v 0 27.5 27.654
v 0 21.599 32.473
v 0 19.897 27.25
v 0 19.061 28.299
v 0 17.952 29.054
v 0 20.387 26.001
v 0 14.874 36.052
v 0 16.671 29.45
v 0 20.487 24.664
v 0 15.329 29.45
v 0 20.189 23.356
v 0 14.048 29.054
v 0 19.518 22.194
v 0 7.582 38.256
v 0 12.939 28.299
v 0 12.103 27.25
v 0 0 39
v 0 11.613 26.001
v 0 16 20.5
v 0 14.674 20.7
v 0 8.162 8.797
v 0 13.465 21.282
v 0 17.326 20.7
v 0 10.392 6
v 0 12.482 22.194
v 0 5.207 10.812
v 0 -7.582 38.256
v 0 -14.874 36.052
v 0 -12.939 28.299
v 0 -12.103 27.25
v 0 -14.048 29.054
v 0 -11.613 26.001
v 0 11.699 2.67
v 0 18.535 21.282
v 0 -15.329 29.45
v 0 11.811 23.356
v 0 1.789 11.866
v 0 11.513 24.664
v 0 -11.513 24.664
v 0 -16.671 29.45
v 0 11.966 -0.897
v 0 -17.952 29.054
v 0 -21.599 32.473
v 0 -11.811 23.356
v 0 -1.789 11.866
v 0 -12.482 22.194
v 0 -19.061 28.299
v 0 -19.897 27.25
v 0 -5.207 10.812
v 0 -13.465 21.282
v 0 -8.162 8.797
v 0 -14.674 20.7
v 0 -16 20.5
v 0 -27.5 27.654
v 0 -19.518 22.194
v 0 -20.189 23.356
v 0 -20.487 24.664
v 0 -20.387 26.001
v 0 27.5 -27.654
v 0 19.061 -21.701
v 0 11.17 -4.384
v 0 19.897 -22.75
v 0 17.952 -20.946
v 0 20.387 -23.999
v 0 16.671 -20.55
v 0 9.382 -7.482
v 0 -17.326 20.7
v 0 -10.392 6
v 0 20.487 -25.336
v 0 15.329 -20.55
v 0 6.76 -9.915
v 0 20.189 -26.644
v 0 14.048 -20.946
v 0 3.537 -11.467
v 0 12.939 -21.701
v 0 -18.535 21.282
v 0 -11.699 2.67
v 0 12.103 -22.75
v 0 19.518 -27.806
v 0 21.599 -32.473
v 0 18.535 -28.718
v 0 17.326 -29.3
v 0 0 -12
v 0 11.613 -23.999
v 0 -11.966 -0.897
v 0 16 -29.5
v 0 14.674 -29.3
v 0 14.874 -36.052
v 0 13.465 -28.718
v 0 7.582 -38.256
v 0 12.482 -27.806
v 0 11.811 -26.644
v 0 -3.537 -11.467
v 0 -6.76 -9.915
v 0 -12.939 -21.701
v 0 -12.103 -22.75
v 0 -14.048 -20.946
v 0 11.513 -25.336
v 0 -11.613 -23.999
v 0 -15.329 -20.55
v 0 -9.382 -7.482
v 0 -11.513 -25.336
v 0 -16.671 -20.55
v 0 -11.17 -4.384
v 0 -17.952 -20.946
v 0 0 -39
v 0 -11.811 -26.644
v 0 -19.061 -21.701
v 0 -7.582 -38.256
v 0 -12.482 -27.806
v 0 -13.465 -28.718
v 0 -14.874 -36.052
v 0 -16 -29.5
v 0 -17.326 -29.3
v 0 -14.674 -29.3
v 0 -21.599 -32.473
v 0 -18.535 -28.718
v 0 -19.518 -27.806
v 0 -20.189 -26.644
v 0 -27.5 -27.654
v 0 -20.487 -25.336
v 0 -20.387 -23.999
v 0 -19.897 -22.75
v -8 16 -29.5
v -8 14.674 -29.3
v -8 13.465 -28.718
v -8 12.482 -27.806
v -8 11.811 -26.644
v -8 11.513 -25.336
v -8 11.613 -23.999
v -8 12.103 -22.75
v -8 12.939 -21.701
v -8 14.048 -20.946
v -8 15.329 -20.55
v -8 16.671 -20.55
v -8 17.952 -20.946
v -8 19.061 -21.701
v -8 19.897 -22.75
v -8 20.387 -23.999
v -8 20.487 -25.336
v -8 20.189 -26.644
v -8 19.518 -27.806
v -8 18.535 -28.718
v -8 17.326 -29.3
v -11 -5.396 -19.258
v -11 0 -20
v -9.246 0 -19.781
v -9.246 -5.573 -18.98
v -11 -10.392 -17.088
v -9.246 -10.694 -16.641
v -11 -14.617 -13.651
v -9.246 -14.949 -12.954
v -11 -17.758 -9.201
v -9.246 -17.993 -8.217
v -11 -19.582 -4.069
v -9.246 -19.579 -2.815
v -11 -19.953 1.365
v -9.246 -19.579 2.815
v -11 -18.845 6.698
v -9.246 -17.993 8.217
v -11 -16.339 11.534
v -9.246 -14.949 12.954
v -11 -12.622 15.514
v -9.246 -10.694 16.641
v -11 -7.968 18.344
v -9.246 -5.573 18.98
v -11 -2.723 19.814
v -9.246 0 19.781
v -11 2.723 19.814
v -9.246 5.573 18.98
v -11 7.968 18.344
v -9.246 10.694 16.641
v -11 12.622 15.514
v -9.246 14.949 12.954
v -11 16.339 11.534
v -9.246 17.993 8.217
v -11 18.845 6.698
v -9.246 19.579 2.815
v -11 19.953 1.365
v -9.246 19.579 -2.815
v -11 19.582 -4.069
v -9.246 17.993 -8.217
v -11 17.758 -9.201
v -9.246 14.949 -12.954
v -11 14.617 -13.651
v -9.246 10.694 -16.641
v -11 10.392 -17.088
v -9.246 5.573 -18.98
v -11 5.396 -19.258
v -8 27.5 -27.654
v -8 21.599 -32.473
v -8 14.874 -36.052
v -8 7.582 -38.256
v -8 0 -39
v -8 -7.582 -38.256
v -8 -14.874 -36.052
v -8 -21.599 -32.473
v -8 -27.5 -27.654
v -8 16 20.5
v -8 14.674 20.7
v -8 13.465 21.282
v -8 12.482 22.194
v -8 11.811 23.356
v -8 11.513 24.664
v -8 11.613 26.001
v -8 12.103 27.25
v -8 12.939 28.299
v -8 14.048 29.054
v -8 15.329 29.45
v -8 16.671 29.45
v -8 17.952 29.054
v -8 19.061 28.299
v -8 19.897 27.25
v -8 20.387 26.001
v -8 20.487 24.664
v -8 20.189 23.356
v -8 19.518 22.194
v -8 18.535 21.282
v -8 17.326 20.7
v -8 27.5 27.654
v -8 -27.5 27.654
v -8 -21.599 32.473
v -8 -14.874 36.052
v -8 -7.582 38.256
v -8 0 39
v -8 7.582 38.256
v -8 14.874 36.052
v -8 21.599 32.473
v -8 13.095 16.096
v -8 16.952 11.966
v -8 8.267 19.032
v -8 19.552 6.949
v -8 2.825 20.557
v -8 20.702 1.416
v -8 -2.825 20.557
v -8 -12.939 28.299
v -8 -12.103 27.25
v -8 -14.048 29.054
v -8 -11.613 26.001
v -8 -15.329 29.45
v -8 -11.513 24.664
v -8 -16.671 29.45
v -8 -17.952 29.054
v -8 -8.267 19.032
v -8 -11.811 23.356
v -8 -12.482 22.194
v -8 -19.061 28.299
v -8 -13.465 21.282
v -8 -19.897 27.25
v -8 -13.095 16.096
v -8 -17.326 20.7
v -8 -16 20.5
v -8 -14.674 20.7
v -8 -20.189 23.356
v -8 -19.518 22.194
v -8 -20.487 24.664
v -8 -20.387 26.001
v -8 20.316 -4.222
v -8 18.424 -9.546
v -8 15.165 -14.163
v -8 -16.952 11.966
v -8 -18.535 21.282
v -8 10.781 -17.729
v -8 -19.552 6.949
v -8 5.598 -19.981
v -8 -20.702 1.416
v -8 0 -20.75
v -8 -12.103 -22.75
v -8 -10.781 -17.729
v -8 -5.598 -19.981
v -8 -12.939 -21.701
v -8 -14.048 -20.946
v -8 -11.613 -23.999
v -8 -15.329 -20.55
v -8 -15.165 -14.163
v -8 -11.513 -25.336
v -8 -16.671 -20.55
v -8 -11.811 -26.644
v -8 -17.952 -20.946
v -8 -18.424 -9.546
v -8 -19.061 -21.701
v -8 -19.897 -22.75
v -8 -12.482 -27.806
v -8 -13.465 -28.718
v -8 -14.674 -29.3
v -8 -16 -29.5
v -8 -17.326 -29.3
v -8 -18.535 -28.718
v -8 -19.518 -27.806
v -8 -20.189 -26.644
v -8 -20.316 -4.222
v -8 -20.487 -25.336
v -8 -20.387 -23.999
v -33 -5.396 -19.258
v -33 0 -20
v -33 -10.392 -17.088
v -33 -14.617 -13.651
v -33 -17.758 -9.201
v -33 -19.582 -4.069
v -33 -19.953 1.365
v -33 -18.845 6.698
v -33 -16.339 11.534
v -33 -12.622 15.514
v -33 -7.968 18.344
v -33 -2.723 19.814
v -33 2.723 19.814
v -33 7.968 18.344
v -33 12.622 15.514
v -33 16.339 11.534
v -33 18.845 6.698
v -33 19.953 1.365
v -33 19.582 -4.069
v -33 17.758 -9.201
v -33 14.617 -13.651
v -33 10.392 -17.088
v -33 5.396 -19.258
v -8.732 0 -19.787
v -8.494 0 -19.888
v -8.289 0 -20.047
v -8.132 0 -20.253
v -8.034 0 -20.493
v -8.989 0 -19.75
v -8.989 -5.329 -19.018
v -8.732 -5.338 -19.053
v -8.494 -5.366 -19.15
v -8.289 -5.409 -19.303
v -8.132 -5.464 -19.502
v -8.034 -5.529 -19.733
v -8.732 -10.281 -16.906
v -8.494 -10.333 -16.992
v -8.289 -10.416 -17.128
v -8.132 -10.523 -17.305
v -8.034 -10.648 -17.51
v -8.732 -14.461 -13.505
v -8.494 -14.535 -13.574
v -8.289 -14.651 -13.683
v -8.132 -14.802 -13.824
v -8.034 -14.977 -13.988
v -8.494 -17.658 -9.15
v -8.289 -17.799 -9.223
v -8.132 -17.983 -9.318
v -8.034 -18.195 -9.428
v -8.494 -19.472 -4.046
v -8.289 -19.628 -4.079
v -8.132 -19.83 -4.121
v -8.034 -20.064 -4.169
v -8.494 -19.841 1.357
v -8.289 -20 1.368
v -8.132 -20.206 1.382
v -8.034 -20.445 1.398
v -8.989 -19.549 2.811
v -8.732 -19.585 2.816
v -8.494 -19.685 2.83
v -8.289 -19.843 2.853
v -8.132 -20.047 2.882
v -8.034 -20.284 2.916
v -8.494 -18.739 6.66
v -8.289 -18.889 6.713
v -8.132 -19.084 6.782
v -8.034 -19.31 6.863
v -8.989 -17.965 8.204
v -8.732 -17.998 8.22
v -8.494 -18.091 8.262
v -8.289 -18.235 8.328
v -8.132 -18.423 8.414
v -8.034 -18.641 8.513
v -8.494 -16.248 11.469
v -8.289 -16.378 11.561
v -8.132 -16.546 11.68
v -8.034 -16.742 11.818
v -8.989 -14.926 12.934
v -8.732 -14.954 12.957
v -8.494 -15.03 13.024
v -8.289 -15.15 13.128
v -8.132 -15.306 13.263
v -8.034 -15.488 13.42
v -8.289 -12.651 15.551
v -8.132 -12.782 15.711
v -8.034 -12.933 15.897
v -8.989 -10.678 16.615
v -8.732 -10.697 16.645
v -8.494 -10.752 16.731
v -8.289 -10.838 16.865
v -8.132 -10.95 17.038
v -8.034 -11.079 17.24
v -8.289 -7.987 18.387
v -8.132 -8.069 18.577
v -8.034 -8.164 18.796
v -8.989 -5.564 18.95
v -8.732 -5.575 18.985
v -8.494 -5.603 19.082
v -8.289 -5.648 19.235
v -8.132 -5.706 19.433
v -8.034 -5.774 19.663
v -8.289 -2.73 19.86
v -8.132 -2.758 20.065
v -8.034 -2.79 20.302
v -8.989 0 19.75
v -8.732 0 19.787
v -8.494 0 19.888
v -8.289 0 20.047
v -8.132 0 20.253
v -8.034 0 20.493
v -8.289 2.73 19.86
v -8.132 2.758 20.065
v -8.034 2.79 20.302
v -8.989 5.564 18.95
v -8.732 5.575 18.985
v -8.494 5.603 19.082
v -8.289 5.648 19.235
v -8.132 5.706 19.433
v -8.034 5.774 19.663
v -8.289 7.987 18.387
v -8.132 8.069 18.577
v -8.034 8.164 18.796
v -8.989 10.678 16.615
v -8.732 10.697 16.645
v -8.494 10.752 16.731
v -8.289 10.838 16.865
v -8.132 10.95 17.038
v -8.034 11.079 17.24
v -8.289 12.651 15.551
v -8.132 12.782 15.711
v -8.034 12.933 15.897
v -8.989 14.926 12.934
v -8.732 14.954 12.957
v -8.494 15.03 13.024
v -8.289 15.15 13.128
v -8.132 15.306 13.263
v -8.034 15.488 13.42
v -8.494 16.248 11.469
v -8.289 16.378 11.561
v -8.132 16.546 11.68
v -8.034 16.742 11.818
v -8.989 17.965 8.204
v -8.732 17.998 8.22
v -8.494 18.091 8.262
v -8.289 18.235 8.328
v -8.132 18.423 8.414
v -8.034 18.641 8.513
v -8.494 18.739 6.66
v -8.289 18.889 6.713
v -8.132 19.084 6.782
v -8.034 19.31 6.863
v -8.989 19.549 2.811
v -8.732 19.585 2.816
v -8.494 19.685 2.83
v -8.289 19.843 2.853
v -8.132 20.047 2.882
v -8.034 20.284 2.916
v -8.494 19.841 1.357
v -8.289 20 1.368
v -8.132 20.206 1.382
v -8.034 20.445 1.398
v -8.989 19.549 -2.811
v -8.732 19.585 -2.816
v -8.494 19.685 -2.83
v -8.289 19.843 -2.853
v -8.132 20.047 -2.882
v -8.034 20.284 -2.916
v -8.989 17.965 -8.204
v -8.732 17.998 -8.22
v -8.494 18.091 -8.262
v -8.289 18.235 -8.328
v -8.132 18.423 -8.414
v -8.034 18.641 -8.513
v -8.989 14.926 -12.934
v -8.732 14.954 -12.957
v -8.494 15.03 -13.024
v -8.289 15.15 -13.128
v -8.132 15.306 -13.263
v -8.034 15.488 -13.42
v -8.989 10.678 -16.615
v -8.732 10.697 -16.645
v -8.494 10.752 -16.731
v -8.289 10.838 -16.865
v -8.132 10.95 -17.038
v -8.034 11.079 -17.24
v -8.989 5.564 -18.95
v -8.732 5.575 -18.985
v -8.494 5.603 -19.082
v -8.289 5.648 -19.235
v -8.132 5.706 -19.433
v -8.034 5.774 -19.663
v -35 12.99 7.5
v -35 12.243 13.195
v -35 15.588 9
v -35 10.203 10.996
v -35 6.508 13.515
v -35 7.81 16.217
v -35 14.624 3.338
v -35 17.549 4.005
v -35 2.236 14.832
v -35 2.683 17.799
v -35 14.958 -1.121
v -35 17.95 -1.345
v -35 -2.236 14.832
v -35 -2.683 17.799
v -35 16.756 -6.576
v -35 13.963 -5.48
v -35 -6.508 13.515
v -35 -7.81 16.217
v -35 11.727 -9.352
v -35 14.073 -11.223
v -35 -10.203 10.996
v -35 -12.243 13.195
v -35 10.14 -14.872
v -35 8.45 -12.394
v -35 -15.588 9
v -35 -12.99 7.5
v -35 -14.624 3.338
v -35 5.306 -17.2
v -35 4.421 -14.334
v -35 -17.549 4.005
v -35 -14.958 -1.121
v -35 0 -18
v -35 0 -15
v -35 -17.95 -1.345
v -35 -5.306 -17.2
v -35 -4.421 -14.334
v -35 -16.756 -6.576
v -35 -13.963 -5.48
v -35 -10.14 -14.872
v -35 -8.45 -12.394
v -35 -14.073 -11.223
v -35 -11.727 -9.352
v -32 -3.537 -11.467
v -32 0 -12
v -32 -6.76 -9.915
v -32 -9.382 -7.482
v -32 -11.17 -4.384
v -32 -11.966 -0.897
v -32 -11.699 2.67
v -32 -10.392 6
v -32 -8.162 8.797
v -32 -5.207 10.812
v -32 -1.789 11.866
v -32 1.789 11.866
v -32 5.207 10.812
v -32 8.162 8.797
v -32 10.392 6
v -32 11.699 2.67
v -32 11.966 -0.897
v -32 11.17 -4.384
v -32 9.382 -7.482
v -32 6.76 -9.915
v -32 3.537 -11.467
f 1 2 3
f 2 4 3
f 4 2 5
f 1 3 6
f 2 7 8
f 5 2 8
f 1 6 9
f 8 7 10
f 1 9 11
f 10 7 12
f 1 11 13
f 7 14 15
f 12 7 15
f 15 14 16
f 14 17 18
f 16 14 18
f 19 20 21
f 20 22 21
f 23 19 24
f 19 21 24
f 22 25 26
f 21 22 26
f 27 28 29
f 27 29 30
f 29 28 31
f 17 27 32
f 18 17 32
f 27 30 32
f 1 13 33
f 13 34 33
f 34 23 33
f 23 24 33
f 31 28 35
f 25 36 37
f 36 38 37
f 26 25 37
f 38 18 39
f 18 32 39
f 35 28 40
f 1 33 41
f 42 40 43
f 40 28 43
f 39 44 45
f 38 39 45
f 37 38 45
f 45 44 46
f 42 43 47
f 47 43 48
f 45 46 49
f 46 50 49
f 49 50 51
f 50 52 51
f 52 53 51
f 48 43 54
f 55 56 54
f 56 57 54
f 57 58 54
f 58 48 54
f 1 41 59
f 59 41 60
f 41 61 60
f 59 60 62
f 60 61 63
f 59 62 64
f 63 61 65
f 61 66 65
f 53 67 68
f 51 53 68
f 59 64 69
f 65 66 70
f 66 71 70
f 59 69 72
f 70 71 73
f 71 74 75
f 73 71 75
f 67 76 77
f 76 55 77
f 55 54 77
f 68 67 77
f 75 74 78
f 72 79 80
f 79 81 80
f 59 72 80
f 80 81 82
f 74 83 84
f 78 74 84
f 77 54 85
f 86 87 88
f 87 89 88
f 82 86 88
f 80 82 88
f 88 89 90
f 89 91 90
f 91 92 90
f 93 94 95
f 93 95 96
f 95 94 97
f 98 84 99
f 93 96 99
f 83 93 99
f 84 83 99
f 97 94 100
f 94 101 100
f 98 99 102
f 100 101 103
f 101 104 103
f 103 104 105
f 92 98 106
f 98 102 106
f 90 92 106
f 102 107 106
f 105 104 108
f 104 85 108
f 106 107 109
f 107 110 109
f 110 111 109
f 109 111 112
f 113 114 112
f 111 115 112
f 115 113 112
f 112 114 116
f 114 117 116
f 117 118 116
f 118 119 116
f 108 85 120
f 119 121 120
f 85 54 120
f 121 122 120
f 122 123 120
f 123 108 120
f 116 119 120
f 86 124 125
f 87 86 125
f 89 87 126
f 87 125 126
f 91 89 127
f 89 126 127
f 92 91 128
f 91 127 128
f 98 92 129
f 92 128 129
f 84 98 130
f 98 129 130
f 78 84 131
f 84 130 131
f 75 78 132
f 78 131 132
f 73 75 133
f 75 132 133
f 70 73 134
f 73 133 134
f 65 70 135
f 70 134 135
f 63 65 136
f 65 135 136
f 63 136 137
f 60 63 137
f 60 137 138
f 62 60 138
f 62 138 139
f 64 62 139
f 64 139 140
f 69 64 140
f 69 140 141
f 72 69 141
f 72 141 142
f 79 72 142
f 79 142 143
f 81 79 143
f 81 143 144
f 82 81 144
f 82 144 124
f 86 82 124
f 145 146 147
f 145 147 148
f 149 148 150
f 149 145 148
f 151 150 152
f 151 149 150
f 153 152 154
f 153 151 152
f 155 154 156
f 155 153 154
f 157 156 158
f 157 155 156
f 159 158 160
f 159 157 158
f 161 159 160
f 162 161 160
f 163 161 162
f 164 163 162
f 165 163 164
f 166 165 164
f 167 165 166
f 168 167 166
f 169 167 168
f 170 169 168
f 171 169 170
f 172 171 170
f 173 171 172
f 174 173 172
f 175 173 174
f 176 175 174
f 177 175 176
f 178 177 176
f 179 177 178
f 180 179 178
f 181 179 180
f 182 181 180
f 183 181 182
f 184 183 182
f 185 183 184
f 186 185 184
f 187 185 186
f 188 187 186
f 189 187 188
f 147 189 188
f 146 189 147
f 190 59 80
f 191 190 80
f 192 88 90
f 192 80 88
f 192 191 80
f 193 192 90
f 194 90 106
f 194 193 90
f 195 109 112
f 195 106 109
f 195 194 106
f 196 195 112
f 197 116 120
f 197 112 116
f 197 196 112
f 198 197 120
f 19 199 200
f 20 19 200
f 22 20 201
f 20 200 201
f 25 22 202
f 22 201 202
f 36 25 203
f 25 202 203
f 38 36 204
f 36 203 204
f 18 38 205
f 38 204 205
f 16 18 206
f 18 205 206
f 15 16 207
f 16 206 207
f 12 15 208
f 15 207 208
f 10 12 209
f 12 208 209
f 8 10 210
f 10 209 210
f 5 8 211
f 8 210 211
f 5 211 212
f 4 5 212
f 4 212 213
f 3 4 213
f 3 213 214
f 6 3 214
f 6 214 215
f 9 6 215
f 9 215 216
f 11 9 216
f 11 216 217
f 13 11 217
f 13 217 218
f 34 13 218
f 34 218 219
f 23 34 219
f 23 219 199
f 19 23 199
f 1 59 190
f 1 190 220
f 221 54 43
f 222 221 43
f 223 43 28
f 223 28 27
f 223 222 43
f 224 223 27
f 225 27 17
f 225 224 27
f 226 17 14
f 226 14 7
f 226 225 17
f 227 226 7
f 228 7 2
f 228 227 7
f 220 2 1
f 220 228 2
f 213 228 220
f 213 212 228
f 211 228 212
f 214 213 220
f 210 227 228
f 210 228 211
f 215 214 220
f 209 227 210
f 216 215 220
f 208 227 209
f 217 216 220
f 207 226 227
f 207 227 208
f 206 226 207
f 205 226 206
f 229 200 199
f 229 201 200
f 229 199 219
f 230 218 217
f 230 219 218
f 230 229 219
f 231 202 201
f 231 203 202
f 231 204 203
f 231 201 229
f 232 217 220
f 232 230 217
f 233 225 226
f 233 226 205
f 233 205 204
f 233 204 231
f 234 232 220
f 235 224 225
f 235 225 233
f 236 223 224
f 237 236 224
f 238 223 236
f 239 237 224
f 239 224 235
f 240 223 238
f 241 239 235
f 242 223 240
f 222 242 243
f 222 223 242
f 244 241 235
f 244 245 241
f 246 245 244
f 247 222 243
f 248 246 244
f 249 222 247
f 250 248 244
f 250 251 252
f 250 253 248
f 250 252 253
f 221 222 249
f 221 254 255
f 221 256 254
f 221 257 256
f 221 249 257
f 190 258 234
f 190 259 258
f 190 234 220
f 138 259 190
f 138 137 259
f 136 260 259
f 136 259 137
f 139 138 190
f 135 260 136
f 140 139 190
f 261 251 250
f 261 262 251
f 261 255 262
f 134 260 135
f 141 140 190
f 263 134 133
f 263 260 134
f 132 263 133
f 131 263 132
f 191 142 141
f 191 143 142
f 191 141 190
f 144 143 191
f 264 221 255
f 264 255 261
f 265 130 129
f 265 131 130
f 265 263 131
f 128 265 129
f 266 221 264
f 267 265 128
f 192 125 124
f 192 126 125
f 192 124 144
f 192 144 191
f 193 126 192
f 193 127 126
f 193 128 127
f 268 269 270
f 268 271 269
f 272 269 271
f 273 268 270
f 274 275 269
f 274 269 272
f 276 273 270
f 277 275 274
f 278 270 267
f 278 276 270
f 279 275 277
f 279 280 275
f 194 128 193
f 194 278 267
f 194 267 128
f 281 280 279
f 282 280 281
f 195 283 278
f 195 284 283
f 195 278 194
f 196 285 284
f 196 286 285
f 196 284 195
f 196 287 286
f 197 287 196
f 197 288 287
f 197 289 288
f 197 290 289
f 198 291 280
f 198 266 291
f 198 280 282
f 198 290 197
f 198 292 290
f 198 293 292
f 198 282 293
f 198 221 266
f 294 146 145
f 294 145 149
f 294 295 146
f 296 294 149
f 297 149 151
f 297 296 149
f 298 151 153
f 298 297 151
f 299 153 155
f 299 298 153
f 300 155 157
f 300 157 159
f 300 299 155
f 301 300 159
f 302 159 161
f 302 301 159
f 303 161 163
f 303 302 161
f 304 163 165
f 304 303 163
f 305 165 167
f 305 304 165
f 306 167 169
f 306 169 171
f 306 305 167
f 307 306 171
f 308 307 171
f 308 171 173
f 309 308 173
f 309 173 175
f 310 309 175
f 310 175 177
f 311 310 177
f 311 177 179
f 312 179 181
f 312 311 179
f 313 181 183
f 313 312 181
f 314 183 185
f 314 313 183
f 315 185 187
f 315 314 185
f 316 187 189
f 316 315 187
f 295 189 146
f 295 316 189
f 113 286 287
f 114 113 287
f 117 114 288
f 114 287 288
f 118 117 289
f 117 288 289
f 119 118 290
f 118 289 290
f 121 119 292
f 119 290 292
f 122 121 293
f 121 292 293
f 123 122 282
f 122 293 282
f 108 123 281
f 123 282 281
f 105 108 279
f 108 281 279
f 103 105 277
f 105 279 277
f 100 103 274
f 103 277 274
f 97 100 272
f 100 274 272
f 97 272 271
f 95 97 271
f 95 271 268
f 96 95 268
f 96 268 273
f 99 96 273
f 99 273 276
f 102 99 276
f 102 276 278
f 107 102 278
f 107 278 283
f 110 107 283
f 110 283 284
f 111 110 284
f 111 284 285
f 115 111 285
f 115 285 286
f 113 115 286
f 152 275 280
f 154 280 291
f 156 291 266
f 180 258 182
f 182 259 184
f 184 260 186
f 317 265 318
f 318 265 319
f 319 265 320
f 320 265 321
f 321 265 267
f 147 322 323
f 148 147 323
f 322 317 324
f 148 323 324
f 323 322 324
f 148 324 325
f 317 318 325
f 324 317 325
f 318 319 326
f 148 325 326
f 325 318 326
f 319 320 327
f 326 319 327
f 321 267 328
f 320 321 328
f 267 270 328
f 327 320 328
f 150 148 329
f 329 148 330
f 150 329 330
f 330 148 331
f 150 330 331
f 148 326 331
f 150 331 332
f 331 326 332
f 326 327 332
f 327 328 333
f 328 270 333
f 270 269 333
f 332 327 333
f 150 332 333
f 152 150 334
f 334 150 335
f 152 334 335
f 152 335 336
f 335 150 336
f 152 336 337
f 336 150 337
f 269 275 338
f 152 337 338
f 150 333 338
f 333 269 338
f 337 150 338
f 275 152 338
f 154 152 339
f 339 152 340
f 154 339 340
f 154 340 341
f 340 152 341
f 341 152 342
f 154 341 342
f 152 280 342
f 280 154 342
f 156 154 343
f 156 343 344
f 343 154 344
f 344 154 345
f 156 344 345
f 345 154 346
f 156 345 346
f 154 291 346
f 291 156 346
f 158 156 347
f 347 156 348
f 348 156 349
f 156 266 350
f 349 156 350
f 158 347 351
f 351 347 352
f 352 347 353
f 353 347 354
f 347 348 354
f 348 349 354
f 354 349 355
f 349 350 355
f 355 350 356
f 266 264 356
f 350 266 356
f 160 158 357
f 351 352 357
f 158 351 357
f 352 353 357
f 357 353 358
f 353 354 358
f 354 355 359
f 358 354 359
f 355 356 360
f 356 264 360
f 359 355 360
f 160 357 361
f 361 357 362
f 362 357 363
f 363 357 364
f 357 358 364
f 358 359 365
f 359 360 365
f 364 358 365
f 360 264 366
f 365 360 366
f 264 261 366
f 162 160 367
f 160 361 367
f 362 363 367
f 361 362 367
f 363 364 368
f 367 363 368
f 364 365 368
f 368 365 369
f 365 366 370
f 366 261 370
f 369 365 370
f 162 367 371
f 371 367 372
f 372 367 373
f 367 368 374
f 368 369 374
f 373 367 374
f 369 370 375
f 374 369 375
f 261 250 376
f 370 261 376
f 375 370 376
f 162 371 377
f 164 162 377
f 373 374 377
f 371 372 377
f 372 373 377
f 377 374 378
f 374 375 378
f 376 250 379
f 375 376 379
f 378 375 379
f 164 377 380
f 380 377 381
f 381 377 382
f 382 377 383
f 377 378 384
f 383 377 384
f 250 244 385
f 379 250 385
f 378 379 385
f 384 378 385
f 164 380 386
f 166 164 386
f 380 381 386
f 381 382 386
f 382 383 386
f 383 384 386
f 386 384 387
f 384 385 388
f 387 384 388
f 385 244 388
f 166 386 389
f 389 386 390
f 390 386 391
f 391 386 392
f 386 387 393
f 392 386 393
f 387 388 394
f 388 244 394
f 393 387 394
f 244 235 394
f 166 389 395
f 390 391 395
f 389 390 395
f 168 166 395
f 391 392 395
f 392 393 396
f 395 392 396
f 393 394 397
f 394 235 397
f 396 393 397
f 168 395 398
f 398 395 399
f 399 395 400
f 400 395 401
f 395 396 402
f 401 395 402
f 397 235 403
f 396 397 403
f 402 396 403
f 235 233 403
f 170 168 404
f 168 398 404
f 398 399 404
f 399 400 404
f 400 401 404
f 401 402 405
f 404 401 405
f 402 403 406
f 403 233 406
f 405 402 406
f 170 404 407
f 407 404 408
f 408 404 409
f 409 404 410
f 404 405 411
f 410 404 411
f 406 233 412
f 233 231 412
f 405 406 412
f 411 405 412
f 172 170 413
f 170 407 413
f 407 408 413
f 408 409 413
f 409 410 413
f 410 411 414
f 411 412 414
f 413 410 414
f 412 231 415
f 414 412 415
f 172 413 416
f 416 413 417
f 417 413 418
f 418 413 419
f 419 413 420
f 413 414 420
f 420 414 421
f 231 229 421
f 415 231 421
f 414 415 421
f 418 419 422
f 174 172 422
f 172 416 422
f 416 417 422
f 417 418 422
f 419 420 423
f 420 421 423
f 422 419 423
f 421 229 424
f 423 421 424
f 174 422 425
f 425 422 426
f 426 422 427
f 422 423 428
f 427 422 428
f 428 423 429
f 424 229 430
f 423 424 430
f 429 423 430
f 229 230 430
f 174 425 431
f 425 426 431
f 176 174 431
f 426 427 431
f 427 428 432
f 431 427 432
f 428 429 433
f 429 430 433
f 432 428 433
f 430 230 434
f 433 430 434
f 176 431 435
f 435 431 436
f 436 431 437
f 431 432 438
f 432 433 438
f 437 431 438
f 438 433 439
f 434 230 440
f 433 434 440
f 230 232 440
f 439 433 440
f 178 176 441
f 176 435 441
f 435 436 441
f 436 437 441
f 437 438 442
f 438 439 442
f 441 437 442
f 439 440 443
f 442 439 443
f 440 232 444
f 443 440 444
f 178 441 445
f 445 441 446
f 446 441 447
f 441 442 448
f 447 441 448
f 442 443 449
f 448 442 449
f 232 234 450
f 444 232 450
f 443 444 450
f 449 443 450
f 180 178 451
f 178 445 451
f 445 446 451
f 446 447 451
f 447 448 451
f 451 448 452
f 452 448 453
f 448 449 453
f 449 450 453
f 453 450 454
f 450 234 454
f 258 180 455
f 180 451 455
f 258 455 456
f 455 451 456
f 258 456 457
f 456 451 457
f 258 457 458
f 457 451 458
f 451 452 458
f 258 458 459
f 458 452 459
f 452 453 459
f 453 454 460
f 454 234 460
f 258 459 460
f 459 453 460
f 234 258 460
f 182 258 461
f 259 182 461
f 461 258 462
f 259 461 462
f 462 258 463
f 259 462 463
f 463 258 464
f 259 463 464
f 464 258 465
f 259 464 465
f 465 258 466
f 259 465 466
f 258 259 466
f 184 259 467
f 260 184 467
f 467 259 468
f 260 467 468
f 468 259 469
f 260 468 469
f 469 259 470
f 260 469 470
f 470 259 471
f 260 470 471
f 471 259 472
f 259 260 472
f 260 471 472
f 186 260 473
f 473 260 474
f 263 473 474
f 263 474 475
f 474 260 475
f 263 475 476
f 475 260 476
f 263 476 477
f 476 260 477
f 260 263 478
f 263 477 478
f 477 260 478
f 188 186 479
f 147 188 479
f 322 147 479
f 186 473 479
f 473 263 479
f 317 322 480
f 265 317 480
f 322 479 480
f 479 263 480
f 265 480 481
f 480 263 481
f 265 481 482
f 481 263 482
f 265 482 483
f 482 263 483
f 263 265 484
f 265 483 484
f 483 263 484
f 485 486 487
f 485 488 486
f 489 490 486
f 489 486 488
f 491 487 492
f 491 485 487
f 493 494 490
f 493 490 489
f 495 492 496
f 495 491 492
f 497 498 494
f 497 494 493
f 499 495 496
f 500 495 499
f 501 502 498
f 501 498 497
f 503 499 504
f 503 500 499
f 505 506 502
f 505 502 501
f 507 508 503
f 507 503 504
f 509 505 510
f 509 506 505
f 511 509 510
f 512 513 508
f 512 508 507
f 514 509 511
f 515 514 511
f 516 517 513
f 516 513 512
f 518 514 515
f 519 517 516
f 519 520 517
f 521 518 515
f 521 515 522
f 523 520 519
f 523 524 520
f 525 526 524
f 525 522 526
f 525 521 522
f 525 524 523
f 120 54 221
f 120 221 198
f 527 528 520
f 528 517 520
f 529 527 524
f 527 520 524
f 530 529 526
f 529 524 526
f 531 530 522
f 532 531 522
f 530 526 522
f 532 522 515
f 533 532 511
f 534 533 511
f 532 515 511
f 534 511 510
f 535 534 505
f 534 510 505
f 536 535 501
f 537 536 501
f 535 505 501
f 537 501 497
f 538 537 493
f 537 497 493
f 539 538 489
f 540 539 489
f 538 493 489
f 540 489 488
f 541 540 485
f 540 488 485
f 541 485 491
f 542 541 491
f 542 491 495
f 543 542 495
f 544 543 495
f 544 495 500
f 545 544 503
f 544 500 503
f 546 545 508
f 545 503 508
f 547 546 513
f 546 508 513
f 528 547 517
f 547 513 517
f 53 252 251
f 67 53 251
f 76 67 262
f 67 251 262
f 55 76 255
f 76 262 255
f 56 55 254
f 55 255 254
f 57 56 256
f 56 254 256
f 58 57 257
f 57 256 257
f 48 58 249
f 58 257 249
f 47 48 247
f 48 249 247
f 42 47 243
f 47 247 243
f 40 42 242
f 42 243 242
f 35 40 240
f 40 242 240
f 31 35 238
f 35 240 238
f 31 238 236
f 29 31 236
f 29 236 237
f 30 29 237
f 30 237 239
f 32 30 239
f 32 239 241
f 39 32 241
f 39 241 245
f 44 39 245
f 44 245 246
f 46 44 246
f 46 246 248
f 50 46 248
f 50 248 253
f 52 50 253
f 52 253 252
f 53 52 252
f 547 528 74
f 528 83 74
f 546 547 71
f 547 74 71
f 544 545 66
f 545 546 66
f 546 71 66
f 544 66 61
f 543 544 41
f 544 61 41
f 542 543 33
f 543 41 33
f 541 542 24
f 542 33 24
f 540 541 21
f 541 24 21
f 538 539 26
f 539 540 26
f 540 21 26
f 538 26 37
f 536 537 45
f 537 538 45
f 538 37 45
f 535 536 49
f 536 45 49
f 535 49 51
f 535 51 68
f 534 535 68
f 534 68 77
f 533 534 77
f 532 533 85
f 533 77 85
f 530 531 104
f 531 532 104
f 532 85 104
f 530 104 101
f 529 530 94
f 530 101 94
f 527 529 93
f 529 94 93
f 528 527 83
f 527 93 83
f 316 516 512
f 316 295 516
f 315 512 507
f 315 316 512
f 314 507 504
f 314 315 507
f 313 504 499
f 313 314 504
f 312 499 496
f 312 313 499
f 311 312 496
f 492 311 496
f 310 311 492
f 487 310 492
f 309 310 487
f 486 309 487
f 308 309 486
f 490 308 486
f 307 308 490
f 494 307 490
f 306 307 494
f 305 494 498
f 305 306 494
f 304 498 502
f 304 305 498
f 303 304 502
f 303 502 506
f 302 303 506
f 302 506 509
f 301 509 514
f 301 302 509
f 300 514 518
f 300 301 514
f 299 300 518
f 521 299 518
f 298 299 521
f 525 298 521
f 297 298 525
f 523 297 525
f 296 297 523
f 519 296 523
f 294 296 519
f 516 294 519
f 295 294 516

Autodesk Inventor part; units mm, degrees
ref_plane "YZ Plane" through (0, 0, 0) normal (1, 0, 0) x (0, 1, 0)
ref_plane "XZ Plane" through (0, 0, 0) normal (0, 1, 0) x (-1, 0, 0)
ref_plane "XY Plane" through (0, 0, 0) normal (0, 0, 1) x (1, 0, 0)
sketch "Эскиз1" plane through (0, 0, 0) normal (0, 1, 0) x (-1, 0, 0)
  line L0 (0, 0) -> (0, -39)
  line L1 (0, -39) -> (8, -39)
  line L2 (8, -39) -> (8, 0)
  line L3 (8, 0) -> (8, -19.75)
  line L4 (8, -19.75) -> (11, -19.75)
  line L5 (11, -19.75) -> (11, 0)
  line L6 (11, 0) -> (11, -20)
  line L7 (11, -20) -> (35, -20)
  line L8 (35, -20) -> (35, 0)
  line L9 (35, 0) -> (35, -12)
  line L10 (35, -12) -> (0, -12)
  line L11 (0, 0) -> (35, 0)
  line L12 (8, -19.75) -> (8, -20.75)
  line L13 (8, -20.75) -> (9, -20.75)
  circle A0 centre (9, -20.75) radius 1
  line L14 (11, -20) -> (9, -19.75)
  point P0 (9.2462, -19.7808)
  dimension "d0" = 39
  dimension "d1" = 8
  dimension "d2" = 19.75
  dimension "d3" = 3
  dimension "d4" = 20
  dimension "d6" = 12
  dimension "d27" = 1
  dimension "d28" = 1
revolve "Вращение1" add sketch "Эскиз1" angle 360 about axis through (0, 0, 0) along (-1, 0, 0) contours L10 L2 L1 L0 | L10 L5 L4 L2 | L10 L8 L7 L6 L5
sketch "Эскиз2" plane through (0, 0, 0) normal (1, 0, 0) x (0, 0, -1)
  line L0 (25, -16) -> (-25, -16)
  line L1 (-25, -16) -> (-25, 16)
  line L2 (-25, 16) -> (25, 16)
  line L3 (25, 16) -> (25, -16)
  line L4 (25, -16) -> (-25, 16) construction
  line L5 (-25, -16) -> (25, 16) construction
  line L6 (0, 0) -> (0, -27.5)
  line L7 (0, -27.5) -> (39.6722, -27.5)
  line L8 (39.6722, -27.5) -> (-36.2697, -27.5)
  line L9 (0, 0) -> (0, 27.5)
  line L10 (0, 27.5) -> (-39.8646, 27.5)
  line L11 (-39.8646, 27.5) -> (34.879, 27.5)
  circle A0 centre (0, 0) radius 39
  point P0 (27.6541, 27.5)
  point P1 (-27.6541, 27.5)
  point P2 (-27.6541, -27.5)
  point P3 (27.6541, -27.5)
  dimension "d8" = 50
  dimension "d9" = 32
  dimension "d23" = 27.5
  dimension "d24" = 27.5
hole "Отверстие1" at (0, -16, 25) at (0, 16, 25) at (0, 16, -25) at (0, -16, -25) direction (-1, 0, 0) diameter 9 end through all
chamfer "Фаска1" distance 2 angle 45 1 edges at (-35, 0, 20)
chamfer "Фаска2" distance 3 angle 45 1 edges at (-35, 0, 12)
extrude "Выдавливание1" cut sketch "Эскиз2" against normal through all contours L7 A0 L8 | L10 A0 L11
revolve "Вращение2" add sketch "Эскиз1" angle 360 about axis through (0, 0, 0) along (-1, 0, 0) contours L4 A0 L2 | L4 L6 L14 A0
thread "Резьба1" size "M24x3" class "6H" standard "ANSI Metric M Profile" full length
properties part number "Втулка-4"
